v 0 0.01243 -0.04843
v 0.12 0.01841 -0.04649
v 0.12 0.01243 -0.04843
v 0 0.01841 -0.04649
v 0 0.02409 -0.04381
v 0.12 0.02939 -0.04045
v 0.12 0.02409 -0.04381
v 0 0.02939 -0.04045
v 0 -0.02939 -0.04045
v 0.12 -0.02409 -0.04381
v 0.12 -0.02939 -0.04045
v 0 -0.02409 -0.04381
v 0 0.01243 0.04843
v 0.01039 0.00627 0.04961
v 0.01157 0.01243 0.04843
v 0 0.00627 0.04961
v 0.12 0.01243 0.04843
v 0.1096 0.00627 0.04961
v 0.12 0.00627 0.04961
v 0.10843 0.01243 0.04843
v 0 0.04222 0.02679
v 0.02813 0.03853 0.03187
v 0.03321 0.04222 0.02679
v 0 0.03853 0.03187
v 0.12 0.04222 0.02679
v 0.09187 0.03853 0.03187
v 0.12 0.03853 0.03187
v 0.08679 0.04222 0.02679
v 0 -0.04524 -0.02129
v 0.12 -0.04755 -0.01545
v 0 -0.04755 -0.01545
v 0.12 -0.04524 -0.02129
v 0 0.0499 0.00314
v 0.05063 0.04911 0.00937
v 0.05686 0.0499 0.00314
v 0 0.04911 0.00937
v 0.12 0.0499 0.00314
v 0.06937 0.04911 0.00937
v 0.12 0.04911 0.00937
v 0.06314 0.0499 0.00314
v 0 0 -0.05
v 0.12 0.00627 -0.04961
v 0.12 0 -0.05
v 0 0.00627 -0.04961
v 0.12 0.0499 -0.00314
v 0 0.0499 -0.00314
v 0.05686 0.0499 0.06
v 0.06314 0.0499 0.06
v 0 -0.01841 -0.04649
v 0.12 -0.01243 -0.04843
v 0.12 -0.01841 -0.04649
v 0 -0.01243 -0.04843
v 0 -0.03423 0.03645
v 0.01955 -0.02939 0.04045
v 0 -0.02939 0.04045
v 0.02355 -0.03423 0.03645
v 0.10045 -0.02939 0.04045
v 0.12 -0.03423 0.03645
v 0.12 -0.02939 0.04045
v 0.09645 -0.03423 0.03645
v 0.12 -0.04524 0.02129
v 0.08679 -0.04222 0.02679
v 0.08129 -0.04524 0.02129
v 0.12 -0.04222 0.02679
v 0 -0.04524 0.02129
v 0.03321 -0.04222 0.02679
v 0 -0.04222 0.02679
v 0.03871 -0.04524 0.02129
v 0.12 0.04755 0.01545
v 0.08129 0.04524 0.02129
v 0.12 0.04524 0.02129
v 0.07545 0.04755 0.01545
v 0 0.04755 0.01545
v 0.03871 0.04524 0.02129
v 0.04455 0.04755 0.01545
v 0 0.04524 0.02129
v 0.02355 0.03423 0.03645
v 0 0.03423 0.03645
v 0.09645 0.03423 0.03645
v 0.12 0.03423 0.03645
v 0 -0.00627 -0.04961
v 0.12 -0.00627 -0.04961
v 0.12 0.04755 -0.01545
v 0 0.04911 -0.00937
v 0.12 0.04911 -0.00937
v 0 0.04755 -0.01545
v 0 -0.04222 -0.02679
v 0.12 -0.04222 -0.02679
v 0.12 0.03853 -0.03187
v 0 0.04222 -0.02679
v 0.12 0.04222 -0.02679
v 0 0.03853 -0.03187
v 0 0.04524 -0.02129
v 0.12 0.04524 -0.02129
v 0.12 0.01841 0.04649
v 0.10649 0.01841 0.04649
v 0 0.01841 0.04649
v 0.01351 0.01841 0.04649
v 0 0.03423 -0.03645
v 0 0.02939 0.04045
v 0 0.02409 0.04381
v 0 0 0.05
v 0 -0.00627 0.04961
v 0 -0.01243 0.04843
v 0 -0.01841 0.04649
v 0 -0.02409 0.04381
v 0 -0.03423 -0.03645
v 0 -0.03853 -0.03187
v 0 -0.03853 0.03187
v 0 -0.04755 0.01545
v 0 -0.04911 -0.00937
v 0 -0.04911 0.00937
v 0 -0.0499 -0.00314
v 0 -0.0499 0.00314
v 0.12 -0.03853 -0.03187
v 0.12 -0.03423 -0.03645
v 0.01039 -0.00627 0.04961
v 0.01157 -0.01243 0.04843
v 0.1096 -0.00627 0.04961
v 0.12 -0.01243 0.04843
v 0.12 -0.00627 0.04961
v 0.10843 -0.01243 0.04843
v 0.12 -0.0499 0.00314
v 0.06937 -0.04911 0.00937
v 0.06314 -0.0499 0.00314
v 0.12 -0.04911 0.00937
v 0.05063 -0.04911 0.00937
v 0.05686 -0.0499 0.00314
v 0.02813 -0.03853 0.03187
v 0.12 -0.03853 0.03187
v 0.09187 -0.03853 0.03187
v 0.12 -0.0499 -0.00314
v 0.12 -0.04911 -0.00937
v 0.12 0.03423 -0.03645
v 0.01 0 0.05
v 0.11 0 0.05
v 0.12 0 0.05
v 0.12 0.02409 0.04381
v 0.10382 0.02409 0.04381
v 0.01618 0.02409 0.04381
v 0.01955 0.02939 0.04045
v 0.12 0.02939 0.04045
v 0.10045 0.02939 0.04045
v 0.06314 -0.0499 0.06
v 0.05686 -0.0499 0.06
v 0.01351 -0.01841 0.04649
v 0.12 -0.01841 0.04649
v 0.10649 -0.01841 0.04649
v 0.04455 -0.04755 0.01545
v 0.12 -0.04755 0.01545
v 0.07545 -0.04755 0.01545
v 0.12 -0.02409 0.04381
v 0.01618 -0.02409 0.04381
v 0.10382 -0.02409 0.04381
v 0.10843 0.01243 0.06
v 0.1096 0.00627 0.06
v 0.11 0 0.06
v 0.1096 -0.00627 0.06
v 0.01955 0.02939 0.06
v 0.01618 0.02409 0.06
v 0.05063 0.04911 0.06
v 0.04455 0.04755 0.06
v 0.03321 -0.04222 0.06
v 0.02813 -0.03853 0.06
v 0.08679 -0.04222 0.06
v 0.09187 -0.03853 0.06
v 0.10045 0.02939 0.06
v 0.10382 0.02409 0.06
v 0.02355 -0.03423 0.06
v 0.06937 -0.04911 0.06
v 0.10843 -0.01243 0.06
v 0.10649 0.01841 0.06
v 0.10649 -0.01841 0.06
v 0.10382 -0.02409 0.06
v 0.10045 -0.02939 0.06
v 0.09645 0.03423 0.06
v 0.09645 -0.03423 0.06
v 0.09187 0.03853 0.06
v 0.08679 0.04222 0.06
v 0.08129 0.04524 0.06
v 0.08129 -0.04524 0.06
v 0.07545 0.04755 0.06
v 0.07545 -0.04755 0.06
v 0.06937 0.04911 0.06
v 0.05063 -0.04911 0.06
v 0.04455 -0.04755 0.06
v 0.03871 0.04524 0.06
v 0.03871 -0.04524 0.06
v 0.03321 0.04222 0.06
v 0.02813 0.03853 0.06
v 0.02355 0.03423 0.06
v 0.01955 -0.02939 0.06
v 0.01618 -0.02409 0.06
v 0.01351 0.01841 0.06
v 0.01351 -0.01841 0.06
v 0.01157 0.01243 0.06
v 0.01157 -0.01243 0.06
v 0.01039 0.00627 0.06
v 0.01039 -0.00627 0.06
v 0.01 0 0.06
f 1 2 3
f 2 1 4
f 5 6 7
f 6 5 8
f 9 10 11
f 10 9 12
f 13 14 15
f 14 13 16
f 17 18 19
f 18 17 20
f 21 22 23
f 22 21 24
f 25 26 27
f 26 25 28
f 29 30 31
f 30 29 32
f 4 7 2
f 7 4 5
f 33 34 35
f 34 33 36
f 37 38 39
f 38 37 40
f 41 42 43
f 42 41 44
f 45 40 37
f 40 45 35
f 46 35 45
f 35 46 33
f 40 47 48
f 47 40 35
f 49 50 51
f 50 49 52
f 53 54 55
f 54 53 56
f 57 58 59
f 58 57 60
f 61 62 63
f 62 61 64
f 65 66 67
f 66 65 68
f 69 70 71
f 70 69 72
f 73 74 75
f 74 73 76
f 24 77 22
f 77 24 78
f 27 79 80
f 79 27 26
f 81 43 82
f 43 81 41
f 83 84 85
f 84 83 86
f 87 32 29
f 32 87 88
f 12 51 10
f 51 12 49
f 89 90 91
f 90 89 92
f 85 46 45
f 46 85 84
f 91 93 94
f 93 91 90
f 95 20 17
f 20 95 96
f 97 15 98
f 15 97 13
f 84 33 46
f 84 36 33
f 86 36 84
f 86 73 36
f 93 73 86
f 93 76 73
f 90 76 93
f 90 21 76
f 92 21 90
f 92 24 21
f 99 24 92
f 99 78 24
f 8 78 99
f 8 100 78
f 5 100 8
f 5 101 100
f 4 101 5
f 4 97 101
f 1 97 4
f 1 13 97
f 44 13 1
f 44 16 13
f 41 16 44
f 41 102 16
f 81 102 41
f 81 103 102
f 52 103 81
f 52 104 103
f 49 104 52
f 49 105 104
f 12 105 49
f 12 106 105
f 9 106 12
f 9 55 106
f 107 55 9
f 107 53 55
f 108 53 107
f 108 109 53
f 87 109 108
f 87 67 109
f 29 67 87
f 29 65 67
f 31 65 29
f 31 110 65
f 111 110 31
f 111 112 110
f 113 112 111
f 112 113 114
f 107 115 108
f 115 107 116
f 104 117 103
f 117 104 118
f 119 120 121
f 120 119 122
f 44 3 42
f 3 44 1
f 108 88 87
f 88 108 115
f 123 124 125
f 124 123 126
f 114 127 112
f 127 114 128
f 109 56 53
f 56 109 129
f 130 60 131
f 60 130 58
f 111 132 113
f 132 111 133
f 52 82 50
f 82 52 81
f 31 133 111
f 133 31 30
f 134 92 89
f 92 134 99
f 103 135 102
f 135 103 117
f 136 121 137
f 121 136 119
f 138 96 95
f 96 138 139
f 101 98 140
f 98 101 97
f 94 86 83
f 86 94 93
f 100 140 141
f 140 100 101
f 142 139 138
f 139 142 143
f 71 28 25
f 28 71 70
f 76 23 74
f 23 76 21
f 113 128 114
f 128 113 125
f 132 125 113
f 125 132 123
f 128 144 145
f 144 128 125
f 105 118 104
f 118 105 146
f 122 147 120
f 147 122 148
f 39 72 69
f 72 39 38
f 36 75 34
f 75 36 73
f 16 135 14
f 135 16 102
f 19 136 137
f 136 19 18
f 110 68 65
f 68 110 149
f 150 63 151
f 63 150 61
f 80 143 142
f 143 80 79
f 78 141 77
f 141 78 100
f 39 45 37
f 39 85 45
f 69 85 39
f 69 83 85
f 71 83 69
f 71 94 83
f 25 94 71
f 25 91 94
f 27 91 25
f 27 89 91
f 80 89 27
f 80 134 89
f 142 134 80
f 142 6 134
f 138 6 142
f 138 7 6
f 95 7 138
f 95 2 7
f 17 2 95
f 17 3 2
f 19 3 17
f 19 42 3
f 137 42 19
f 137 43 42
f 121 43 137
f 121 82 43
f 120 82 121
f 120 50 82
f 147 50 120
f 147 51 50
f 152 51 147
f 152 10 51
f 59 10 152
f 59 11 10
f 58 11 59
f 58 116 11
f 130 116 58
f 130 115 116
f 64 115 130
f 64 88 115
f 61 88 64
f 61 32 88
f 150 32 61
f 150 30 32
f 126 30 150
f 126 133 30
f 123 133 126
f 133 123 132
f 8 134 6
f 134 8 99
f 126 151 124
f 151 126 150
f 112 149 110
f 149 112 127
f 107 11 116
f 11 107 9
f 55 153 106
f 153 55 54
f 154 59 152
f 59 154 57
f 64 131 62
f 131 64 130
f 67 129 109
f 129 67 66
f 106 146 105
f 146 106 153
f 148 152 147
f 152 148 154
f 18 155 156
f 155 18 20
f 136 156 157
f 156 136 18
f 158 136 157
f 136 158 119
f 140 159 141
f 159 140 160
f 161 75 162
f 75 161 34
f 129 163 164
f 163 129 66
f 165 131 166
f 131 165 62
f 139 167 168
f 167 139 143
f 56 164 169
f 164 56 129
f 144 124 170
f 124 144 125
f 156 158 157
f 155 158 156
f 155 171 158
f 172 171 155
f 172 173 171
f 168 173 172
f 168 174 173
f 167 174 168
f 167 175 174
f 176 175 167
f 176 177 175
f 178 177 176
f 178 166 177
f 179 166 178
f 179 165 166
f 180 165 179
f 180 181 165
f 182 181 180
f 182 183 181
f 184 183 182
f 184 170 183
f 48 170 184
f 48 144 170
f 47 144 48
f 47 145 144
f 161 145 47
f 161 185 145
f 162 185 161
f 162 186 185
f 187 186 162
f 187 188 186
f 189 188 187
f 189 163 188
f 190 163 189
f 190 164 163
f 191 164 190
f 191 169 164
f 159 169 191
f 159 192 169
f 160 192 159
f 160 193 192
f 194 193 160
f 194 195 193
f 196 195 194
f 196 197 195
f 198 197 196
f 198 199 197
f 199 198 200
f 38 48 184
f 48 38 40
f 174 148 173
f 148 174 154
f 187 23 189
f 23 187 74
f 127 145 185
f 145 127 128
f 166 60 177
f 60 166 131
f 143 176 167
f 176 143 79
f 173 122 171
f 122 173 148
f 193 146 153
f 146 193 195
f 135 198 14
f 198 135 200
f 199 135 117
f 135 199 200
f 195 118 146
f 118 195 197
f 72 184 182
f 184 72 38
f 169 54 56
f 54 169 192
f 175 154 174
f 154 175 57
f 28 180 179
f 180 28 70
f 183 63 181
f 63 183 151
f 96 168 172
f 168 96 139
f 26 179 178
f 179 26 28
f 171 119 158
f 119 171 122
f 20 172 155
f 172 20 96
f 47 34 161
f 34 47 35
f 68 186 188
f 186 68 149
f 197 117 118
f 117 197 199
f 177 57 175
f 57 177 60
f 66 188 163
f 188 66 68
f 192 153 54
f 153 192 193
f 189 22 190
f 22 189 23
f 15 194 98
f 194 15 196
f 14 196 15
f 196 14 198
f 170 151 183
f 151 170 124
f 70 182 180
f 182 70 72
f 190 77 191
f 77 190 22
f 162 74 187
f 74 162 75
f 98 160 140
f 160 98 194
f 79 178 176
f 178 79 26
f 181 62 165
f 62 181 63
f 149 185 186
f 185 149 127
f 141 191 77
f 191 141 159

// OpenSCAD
$fn=50;  // REMOVE
LENGTH = 0.12;  // REMOVE
DO = 0.1; // REMOVE
rotate([0, 90, 0])
translate([0, 0, (LENGTH)/2])
cylinder(h = (LENGTH), r = (DO)/2, center = true);
translate([(LENGTH)/2, 0, (LENGTH)/4])
cylinder(h = (LENGTH)/2, r = (DO)/2, center = true);
